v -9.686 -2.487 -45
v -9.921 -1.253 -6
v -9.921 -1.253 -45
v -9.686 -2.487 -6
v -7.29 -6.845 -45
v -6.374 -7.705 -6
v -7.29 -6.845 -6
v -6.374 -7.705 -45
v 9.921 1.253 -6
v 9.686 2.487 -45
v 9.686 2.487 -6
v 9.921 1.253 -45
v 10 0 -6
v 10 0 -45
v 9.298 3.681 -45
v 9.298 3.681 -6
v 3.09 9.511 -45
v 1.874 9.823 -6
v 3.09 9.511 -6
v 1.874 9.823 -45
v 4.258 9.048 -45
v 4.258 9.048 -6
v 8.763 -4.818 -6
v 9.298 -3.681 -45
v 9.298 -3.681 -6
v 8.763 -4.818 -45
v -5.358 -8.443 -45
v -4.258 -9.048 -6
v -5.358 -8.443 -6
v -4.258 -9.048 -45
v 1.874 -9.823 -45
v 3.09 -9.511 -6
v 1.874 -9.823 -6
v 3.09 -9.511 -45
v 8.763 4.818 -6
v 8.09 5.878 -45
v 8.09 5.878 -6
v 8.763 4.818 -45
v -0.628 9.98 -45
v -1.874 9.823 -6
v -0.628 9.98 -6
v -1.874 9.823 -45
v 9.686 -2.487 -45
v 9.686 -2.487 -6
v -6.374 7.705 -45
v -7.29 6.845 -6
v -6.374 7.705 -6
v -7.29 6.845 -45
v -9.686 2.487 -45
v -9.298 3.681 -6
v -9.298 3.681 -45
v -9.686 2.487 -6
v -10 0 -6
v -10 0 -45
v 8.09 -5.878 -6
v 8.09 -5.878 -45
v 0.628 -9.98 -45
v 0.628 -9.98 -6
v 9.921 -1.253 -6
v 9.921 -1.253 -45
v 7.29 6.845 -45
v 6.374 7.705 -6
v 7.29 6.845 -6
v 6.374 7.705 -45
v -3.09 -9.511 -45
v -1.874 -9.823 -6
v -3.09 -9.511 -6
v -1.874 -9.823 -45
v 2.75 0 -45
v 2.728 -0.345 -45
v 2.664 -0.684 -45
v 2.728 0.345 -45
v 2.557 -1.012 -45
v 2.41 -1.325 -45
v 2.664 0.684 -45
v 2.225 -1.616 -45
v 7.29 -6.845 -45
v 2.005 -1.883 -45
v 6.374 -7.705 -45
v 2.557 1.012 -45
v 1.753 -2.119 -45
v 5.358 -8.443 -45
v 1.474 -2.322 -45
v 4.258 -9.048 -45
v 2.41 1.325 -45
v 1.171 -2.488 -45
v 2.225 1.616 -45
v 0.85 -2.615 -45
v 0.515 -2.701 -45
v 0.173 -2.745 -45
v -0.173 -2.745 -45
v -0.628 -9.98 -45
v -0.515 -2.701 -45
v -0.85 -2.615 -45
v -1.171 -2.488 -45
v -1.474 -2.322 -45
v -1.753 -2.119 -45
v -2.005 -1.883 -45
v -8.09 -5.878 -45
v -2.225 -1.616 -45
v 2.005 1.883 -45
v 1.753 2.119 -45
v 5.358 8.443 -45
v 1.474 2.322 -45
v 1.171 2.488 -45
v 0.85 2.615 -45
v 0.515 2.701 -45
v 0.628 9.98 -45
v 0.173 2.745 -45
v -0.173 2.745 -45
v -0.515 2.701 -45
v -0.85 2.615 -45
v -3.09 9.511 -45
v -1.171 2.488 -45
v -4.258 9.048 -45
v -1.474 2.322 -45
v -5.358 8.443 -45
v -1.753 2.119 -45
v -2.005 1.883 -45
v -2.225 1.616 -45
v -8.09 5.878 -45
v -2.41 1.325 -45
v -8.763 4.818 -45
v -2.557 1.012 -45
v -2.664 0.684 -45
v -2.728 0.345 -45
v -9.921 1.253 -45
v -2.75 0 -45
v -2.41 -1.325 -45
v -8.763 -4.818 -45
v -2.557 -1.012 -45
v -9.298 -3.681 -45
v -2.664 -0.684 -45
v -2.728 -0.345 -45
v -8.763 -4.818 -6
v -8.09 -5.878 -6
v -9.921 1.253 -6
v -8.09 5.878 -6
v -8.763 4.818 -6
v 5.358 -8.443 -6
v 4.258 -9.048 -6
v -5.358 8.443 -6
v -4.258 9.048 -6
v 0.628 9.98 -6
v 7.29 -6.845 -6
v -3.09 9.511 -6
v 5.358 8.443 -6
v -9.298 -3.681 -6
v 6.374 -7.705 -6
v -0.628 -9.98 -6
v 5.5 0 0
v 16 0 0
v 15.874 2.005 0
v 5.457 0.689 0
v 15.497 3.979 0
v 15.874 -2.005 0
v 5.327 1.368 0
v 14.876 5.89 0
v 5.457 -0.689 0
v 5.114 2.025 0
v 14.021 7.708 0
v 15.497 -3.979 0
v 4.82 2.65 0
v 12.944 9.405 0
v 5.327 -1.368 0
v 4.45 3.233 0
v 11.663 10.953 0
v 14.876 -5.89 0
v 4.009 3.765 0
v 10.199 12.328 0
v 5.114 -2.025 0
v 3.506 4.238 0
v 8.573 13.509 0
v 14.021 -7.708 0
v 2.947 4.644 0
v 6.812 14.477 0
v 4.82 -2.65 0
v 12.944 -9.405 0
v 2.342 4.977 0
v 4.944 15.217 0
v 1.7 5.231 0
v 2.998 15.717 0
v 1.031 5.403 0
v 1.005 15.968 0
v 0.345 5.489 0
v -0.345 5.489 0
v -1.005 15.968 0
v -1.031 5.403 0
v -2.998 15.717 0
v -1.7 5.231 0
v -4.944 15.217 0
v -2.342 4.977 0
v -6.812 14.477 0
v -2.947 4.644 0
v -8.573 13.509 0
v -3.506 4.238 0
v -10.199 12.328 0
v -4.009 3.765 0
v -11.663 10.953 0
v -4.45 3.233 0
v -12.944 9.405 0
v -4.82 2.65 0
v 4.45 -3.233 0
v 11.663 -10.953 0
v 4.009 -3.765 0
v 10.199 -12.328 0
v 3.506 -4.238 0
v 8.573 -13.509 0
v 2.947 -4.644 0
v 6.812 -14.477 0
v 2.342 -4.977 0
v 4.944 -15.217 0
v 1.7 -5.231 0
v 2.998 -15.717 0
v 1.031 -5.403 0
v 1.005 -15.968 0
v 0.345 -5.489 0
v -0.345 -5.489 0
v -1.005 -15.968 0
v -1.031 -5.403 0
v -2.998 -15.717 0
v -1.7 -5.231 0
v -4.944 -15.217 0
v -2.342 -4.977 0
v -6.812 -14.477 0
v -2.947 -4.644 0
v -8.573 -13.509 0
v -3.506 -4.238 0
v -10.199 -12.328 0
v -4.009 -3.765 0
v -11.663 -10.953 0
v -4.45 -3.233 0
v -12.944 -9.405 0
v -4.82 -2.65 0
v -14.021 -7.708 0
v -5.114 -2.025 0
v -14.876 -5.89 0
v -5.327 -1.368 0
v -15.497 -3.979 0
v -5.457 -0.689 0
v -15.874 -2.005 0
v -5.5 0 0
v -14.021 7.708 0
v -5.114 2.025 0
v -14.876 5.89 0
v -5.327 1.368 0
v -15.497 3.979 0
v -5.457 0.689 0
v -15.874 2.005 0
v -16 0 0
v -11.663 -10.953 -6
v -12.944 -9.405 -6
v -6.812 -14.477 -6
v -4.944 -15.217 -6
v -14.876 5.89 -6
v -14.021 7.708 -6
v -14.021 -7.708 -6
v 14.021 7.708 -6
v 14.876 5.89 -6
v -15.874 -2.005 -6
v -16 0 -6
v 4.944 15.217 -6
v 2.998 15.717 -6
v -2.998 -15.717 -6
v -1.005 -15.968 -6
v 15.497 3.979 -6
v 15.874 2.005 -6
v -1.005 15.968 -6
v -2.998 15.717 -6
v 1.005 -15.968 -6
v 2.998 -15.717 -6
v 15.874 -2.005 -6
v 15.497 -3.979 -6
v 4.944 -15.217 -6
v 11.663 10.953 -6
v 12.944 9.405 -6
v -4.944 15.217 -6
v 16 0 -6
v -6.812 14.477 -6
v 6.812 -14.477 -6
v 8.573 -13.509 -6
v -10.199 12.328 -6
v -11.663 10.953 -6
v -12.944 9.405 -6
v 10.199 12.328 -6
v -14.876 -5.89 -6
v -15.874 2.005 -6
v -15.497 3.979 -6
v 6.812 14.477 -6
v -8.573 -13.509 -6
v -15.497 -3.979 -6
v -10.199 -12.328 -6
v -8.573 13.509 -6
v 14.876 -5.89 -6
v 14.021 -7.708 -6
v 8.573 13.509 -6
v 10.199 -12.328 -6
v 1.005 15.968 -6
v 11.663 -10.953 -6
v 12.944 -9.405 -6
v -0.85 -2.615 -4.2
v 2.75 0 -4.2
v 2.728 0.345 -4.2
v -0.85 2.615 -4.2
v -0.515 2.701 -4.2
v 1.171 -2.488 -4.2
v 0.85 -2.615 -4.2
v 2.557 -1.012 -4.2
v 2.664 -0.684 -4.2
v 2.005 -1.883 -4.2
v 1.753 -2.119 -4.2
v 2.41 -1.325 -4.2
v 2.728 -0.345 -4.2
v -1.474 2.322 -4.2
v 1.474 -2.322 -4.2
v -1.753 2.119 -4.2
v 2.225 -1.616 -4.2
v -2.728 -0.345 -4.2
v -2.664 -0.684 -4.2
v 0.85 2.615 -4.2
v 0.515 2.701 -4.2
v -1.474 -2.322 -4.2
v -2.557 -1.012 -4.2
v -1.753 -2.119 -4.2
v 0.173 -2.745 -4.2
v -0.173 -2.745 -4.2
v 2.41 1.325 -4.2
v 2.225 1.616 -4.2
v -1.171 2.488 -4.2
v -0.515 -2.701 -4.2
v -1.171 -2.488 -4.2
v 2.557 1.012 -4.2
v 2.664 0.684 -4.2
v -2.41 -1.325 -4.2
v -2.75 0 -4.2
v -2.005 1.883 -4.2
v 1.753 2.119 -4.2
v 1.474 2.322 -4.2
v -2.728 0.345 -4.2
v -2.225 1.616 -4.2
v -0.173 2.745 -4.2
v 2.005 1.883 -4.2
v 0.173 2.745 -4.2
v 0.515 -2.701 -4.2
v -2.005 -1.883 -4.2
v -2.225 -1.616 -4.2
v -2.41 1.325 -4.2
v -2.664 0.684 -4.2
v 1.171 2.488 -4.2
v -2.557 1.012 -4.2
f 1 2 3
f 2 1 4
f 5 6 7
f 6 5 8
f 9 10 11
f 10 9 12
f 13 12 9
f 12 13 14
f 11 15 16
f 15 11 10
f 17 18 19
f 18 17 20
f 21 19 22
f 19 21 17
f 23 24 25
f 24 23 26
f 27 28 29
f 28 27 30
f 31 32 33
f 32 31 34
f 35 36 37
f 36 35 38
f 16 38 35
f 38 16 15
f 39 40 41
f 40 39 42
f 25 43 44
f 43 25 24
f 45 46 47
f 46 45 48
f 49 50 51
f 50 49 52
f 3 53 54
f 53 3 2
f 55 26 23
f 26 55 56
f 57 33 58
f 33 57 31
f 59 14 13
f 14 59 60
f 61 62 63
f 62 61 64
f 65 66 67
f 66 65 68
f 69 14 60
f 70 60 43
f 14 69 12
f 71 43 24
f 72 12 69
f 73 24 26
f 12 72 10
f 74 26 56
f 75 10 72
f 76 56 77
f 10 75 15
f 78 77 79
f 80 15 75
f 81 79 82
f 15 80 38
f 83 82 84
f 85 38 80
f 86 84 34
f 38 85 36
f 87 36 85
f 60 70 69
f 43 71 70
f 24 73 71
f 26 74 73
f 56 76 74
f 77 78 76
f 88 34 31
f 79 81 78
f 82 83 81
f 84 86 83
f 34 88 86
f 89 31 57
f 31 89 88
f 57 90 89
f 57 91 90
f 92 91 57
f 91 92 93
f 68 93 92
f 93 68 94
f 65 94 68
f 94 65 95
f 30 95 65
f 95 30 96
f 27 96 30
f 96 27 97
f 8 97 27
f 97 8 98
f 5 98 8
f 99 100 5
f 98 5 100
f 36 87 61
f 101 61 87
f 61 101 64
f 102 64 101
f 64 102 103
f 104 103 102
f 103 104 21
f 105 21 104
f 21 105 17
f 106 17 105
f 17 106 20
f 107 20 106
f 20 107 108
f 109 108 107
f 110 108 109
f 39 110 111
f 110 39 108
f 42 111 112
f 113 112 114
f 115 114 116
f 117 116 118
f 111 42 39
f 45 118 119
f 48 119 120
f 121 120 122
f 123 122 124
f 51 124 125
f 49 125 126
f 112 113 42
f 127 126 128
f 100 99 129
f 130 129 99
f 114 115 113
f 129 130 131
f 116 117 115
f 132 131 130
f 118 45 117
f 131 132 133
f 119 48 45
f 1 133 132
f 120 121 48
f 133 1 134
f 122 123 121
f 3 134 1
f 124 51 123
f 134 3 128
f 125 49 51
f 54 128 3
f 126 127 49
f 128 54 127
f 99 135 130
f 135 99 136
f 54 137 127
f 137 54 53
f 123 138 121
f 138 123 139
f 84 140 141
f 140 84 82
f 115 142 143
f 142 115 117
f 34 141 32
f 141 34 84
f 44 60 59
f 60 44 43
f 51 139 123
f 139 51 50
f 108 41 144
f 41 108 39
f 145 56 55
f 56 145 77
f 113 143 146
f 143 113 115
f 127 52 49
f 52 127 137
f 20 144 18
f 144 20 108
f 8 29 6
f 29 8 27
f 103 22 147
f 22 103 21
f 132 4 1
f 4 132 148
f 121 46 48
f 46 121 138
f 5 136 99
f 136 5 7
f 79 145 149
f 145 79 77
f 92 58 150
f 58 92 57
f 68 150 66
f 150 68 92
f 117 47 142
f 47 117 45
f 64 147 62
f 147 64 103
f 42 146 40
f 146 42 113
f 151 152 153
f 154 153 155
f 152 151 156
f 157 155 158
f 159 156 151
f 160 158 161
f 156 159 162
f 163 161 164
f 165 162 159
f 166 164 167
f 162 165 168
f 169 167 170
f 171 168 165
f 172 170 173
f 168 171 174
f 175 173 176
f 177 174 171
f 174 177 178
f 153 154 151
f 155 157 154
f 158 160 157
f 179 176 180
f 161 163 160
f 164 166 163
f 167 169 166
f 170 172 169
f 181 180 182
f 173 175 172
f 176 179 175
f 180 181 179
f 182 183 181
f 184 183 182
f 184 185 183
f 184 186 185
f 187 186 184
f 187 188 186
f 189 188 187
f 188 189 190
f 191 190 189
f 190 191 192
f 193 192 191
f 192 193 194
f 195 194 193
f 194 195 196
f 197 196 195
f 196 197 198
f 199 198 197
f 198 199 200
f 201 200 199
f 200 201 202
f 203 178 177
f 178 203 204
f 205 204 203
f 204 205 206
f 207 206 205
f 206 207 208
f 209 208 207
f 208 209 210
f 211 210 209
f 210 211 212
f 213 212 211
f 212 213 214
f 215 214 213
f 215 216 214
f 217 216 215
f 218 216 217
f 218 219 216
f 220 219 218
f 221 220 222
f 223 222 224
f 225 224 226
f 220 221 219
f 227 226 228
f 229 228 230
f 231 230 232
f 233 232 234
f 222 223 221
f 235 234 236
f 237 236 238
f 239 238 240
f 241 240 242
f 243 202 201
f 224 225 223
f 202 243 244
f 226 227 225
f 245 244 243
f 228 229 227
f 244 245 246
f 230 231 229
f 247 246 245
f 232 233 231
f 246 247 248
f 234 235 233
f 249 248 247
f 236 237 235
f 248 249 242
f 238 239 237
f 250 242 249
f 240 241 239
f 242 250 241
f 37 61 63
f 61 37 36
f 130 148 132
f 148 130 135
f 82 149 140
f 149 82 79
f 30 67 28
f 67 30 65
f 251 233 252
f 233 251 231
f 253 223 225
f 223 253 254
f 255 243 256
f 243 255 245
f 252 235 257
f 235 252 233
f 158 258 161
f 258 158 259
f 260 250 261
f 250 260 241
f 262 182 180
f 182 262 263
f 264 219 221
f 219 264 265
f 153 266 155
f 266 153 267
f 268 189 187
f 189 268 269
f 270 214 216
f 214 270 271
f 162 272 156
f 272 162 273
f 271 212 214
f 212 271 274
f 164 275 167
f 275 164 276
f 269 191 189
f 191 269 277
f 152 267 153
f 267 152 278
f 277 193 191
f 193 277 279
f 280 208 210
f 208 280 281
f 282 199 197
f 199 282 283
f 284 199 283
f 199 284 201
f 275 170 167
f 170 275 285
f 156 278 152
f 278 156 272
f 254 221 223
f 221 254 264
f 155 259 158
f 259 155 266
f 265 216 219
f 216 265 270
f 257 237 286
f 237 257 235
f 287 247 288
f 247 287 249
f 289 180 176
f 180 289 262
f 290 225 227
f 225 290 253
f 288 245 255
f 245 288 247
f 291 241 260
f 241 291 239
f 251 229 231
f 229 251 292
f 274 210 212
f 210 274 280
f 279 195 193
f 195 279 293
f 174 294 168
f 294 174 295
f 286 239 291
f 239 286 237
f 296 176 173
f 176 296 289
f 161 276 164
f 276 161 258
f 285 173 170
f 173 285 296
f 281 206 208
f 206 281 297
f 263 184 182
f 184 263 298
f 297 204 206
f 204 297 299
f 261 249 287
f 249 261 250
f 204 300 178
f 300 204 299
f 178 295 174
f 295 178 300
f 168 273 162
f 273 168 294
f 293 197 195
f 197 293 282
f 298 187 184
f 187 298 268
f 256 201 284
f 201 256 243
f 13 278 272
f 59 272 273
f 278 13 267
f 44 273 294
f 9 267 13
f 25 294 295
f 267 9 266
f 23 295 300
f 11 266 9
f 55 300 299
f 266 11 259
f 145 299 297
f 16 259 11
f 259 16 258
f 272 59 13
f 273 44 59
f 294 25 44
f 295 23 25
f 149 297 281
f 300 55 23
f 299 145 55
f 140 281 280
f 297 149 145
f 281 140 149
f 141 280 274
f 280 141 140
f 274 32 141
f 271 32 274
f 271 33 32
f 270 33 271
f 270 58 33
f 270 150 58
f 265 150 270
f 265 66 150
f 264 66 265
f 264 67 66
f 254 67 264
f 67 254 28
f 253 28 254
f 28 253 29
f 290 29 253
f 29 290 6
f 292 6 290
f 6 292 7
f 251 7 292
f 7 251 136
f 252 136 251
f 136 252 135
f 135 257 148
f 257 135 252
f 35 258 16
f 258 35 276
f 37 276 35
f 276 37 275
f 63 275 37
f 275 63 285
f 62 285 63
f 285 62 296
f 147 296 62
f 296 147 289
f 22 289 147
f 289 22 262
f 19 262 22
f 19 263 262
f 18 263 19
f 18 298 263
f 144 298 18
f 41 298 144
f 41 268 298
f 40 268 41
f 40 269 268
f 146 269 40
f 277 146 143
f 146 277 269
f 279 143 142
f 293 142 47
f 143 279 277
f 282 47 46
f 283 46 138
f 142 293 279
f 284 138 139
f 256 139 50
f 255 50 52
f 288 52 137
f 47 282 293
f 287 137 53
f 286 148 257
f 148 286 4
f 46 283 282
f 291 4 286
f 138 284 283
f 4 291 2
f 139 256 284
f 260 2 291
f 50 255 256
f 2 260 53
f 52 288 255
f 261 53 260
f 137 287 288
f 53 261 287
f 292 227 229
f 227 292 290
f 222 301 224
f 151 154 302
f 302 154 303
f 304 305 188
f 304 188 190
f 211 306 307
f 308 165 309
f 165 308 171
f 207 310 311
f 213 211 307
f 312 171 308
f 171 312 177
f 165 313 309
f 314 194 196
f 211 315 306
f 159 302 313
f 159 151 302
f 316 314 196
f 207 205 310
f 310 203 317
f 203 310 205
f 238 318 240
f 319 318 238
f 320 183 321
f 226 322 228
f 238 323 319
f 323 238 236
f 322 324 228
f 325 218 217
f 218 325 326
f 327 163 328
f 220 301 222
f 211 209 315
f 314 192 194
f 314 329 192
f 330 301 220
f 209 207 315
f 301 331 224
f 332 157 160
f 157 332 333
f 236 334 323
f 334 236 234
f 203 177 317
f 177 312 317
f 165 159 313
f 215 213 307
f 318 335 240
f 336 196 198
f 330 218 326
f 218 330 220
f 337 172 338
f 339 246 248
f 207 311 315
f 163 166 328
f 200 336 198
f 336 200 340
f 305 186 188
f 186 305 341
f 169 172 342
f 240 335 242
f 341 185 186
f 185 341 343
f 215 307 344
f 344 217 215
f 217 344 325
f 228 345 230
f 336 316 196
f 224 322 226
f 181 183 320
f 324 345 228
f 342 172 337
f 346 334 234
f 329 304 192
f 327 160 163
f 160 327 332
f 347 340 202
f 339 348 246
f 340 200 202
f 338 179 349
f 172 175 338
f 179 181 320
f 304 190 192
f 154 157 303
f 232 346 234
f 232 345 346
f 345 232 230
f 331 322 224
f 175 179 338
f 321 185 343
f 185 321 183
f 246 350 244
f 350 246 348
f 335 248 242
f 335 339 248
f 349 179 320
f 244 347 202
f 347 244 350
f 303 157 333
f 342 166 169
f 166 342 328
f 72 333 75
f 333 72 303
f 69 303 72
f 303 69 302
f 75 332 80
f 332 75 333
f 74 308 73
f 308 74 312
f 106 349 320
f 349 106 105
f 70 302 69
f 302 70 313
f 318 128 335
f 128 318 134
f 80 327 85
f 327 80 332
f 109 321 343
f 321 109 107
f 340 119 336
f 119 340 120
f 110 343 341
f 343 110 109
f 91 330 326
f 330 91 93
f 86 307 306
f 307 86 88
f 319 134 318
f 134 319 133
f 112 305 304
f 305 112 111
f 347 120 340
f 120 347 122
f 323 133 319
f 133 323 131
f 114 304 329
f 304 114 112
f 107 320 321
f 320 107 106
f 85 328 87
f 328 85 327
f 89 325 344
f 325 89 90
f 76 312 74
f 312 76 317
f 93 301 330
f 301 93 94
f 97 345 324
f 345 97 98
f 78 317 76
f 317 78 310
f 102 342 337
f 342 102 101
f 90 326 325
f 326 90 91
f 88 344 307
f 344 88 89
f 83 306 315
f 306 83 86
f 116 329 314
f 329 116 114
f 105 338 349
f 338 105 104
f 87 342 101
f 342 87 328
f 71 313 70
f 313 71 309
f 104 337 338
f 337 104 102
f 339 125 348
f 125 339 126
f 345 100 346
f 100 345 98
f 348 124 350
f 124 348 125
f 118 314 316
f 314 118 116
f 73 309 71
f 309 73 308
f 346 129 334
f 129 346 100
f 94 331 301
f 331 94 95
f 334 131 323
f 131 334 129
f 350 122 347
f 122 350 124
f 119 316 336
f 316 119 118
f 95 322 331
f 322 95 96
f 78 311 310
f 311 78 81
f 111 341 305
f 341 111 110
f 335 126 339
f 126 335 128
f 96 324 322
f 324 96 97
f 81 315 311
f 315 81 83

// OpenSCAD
$fn = 50;


difference() {
	union() {
		translate(v = [0, 0, -45.0000000000]) {
			cylinder(h = 45, r = 10.0000000000);
		}
		translate(v = [0, 0, -6.0000000000]) {
			cylinder(h = 6, r = 16.0000000000);
		}
	}
	union() {
		translate(v = [0, 0, 0]) {
			rotate(a = [0, 0, 0]) {
				difference() {
					union() {
						#translate(v = [0, 0, -45.0000000000]) {
							cylinder(h = 45, r = 2.2500000000);
						}
						#translate(v = [0, 0, -4.2000000000]) {
							cylinder(h = 4.2000000000, r = 10.0000000000, r1 = 2.7500000000, r2 = 5.5000000000);
						}
						#translate(v = [0, 0, -45.0000000000]) {
							cylinder(h = 45, r = 2.7500000000);
						}
						#translate(v = [0, 0, -45.0000000000]) {
							cylinder(h = 45, r = 2.2500000000);
						}
					}
					union();
				}
			}
		}
	}
}
